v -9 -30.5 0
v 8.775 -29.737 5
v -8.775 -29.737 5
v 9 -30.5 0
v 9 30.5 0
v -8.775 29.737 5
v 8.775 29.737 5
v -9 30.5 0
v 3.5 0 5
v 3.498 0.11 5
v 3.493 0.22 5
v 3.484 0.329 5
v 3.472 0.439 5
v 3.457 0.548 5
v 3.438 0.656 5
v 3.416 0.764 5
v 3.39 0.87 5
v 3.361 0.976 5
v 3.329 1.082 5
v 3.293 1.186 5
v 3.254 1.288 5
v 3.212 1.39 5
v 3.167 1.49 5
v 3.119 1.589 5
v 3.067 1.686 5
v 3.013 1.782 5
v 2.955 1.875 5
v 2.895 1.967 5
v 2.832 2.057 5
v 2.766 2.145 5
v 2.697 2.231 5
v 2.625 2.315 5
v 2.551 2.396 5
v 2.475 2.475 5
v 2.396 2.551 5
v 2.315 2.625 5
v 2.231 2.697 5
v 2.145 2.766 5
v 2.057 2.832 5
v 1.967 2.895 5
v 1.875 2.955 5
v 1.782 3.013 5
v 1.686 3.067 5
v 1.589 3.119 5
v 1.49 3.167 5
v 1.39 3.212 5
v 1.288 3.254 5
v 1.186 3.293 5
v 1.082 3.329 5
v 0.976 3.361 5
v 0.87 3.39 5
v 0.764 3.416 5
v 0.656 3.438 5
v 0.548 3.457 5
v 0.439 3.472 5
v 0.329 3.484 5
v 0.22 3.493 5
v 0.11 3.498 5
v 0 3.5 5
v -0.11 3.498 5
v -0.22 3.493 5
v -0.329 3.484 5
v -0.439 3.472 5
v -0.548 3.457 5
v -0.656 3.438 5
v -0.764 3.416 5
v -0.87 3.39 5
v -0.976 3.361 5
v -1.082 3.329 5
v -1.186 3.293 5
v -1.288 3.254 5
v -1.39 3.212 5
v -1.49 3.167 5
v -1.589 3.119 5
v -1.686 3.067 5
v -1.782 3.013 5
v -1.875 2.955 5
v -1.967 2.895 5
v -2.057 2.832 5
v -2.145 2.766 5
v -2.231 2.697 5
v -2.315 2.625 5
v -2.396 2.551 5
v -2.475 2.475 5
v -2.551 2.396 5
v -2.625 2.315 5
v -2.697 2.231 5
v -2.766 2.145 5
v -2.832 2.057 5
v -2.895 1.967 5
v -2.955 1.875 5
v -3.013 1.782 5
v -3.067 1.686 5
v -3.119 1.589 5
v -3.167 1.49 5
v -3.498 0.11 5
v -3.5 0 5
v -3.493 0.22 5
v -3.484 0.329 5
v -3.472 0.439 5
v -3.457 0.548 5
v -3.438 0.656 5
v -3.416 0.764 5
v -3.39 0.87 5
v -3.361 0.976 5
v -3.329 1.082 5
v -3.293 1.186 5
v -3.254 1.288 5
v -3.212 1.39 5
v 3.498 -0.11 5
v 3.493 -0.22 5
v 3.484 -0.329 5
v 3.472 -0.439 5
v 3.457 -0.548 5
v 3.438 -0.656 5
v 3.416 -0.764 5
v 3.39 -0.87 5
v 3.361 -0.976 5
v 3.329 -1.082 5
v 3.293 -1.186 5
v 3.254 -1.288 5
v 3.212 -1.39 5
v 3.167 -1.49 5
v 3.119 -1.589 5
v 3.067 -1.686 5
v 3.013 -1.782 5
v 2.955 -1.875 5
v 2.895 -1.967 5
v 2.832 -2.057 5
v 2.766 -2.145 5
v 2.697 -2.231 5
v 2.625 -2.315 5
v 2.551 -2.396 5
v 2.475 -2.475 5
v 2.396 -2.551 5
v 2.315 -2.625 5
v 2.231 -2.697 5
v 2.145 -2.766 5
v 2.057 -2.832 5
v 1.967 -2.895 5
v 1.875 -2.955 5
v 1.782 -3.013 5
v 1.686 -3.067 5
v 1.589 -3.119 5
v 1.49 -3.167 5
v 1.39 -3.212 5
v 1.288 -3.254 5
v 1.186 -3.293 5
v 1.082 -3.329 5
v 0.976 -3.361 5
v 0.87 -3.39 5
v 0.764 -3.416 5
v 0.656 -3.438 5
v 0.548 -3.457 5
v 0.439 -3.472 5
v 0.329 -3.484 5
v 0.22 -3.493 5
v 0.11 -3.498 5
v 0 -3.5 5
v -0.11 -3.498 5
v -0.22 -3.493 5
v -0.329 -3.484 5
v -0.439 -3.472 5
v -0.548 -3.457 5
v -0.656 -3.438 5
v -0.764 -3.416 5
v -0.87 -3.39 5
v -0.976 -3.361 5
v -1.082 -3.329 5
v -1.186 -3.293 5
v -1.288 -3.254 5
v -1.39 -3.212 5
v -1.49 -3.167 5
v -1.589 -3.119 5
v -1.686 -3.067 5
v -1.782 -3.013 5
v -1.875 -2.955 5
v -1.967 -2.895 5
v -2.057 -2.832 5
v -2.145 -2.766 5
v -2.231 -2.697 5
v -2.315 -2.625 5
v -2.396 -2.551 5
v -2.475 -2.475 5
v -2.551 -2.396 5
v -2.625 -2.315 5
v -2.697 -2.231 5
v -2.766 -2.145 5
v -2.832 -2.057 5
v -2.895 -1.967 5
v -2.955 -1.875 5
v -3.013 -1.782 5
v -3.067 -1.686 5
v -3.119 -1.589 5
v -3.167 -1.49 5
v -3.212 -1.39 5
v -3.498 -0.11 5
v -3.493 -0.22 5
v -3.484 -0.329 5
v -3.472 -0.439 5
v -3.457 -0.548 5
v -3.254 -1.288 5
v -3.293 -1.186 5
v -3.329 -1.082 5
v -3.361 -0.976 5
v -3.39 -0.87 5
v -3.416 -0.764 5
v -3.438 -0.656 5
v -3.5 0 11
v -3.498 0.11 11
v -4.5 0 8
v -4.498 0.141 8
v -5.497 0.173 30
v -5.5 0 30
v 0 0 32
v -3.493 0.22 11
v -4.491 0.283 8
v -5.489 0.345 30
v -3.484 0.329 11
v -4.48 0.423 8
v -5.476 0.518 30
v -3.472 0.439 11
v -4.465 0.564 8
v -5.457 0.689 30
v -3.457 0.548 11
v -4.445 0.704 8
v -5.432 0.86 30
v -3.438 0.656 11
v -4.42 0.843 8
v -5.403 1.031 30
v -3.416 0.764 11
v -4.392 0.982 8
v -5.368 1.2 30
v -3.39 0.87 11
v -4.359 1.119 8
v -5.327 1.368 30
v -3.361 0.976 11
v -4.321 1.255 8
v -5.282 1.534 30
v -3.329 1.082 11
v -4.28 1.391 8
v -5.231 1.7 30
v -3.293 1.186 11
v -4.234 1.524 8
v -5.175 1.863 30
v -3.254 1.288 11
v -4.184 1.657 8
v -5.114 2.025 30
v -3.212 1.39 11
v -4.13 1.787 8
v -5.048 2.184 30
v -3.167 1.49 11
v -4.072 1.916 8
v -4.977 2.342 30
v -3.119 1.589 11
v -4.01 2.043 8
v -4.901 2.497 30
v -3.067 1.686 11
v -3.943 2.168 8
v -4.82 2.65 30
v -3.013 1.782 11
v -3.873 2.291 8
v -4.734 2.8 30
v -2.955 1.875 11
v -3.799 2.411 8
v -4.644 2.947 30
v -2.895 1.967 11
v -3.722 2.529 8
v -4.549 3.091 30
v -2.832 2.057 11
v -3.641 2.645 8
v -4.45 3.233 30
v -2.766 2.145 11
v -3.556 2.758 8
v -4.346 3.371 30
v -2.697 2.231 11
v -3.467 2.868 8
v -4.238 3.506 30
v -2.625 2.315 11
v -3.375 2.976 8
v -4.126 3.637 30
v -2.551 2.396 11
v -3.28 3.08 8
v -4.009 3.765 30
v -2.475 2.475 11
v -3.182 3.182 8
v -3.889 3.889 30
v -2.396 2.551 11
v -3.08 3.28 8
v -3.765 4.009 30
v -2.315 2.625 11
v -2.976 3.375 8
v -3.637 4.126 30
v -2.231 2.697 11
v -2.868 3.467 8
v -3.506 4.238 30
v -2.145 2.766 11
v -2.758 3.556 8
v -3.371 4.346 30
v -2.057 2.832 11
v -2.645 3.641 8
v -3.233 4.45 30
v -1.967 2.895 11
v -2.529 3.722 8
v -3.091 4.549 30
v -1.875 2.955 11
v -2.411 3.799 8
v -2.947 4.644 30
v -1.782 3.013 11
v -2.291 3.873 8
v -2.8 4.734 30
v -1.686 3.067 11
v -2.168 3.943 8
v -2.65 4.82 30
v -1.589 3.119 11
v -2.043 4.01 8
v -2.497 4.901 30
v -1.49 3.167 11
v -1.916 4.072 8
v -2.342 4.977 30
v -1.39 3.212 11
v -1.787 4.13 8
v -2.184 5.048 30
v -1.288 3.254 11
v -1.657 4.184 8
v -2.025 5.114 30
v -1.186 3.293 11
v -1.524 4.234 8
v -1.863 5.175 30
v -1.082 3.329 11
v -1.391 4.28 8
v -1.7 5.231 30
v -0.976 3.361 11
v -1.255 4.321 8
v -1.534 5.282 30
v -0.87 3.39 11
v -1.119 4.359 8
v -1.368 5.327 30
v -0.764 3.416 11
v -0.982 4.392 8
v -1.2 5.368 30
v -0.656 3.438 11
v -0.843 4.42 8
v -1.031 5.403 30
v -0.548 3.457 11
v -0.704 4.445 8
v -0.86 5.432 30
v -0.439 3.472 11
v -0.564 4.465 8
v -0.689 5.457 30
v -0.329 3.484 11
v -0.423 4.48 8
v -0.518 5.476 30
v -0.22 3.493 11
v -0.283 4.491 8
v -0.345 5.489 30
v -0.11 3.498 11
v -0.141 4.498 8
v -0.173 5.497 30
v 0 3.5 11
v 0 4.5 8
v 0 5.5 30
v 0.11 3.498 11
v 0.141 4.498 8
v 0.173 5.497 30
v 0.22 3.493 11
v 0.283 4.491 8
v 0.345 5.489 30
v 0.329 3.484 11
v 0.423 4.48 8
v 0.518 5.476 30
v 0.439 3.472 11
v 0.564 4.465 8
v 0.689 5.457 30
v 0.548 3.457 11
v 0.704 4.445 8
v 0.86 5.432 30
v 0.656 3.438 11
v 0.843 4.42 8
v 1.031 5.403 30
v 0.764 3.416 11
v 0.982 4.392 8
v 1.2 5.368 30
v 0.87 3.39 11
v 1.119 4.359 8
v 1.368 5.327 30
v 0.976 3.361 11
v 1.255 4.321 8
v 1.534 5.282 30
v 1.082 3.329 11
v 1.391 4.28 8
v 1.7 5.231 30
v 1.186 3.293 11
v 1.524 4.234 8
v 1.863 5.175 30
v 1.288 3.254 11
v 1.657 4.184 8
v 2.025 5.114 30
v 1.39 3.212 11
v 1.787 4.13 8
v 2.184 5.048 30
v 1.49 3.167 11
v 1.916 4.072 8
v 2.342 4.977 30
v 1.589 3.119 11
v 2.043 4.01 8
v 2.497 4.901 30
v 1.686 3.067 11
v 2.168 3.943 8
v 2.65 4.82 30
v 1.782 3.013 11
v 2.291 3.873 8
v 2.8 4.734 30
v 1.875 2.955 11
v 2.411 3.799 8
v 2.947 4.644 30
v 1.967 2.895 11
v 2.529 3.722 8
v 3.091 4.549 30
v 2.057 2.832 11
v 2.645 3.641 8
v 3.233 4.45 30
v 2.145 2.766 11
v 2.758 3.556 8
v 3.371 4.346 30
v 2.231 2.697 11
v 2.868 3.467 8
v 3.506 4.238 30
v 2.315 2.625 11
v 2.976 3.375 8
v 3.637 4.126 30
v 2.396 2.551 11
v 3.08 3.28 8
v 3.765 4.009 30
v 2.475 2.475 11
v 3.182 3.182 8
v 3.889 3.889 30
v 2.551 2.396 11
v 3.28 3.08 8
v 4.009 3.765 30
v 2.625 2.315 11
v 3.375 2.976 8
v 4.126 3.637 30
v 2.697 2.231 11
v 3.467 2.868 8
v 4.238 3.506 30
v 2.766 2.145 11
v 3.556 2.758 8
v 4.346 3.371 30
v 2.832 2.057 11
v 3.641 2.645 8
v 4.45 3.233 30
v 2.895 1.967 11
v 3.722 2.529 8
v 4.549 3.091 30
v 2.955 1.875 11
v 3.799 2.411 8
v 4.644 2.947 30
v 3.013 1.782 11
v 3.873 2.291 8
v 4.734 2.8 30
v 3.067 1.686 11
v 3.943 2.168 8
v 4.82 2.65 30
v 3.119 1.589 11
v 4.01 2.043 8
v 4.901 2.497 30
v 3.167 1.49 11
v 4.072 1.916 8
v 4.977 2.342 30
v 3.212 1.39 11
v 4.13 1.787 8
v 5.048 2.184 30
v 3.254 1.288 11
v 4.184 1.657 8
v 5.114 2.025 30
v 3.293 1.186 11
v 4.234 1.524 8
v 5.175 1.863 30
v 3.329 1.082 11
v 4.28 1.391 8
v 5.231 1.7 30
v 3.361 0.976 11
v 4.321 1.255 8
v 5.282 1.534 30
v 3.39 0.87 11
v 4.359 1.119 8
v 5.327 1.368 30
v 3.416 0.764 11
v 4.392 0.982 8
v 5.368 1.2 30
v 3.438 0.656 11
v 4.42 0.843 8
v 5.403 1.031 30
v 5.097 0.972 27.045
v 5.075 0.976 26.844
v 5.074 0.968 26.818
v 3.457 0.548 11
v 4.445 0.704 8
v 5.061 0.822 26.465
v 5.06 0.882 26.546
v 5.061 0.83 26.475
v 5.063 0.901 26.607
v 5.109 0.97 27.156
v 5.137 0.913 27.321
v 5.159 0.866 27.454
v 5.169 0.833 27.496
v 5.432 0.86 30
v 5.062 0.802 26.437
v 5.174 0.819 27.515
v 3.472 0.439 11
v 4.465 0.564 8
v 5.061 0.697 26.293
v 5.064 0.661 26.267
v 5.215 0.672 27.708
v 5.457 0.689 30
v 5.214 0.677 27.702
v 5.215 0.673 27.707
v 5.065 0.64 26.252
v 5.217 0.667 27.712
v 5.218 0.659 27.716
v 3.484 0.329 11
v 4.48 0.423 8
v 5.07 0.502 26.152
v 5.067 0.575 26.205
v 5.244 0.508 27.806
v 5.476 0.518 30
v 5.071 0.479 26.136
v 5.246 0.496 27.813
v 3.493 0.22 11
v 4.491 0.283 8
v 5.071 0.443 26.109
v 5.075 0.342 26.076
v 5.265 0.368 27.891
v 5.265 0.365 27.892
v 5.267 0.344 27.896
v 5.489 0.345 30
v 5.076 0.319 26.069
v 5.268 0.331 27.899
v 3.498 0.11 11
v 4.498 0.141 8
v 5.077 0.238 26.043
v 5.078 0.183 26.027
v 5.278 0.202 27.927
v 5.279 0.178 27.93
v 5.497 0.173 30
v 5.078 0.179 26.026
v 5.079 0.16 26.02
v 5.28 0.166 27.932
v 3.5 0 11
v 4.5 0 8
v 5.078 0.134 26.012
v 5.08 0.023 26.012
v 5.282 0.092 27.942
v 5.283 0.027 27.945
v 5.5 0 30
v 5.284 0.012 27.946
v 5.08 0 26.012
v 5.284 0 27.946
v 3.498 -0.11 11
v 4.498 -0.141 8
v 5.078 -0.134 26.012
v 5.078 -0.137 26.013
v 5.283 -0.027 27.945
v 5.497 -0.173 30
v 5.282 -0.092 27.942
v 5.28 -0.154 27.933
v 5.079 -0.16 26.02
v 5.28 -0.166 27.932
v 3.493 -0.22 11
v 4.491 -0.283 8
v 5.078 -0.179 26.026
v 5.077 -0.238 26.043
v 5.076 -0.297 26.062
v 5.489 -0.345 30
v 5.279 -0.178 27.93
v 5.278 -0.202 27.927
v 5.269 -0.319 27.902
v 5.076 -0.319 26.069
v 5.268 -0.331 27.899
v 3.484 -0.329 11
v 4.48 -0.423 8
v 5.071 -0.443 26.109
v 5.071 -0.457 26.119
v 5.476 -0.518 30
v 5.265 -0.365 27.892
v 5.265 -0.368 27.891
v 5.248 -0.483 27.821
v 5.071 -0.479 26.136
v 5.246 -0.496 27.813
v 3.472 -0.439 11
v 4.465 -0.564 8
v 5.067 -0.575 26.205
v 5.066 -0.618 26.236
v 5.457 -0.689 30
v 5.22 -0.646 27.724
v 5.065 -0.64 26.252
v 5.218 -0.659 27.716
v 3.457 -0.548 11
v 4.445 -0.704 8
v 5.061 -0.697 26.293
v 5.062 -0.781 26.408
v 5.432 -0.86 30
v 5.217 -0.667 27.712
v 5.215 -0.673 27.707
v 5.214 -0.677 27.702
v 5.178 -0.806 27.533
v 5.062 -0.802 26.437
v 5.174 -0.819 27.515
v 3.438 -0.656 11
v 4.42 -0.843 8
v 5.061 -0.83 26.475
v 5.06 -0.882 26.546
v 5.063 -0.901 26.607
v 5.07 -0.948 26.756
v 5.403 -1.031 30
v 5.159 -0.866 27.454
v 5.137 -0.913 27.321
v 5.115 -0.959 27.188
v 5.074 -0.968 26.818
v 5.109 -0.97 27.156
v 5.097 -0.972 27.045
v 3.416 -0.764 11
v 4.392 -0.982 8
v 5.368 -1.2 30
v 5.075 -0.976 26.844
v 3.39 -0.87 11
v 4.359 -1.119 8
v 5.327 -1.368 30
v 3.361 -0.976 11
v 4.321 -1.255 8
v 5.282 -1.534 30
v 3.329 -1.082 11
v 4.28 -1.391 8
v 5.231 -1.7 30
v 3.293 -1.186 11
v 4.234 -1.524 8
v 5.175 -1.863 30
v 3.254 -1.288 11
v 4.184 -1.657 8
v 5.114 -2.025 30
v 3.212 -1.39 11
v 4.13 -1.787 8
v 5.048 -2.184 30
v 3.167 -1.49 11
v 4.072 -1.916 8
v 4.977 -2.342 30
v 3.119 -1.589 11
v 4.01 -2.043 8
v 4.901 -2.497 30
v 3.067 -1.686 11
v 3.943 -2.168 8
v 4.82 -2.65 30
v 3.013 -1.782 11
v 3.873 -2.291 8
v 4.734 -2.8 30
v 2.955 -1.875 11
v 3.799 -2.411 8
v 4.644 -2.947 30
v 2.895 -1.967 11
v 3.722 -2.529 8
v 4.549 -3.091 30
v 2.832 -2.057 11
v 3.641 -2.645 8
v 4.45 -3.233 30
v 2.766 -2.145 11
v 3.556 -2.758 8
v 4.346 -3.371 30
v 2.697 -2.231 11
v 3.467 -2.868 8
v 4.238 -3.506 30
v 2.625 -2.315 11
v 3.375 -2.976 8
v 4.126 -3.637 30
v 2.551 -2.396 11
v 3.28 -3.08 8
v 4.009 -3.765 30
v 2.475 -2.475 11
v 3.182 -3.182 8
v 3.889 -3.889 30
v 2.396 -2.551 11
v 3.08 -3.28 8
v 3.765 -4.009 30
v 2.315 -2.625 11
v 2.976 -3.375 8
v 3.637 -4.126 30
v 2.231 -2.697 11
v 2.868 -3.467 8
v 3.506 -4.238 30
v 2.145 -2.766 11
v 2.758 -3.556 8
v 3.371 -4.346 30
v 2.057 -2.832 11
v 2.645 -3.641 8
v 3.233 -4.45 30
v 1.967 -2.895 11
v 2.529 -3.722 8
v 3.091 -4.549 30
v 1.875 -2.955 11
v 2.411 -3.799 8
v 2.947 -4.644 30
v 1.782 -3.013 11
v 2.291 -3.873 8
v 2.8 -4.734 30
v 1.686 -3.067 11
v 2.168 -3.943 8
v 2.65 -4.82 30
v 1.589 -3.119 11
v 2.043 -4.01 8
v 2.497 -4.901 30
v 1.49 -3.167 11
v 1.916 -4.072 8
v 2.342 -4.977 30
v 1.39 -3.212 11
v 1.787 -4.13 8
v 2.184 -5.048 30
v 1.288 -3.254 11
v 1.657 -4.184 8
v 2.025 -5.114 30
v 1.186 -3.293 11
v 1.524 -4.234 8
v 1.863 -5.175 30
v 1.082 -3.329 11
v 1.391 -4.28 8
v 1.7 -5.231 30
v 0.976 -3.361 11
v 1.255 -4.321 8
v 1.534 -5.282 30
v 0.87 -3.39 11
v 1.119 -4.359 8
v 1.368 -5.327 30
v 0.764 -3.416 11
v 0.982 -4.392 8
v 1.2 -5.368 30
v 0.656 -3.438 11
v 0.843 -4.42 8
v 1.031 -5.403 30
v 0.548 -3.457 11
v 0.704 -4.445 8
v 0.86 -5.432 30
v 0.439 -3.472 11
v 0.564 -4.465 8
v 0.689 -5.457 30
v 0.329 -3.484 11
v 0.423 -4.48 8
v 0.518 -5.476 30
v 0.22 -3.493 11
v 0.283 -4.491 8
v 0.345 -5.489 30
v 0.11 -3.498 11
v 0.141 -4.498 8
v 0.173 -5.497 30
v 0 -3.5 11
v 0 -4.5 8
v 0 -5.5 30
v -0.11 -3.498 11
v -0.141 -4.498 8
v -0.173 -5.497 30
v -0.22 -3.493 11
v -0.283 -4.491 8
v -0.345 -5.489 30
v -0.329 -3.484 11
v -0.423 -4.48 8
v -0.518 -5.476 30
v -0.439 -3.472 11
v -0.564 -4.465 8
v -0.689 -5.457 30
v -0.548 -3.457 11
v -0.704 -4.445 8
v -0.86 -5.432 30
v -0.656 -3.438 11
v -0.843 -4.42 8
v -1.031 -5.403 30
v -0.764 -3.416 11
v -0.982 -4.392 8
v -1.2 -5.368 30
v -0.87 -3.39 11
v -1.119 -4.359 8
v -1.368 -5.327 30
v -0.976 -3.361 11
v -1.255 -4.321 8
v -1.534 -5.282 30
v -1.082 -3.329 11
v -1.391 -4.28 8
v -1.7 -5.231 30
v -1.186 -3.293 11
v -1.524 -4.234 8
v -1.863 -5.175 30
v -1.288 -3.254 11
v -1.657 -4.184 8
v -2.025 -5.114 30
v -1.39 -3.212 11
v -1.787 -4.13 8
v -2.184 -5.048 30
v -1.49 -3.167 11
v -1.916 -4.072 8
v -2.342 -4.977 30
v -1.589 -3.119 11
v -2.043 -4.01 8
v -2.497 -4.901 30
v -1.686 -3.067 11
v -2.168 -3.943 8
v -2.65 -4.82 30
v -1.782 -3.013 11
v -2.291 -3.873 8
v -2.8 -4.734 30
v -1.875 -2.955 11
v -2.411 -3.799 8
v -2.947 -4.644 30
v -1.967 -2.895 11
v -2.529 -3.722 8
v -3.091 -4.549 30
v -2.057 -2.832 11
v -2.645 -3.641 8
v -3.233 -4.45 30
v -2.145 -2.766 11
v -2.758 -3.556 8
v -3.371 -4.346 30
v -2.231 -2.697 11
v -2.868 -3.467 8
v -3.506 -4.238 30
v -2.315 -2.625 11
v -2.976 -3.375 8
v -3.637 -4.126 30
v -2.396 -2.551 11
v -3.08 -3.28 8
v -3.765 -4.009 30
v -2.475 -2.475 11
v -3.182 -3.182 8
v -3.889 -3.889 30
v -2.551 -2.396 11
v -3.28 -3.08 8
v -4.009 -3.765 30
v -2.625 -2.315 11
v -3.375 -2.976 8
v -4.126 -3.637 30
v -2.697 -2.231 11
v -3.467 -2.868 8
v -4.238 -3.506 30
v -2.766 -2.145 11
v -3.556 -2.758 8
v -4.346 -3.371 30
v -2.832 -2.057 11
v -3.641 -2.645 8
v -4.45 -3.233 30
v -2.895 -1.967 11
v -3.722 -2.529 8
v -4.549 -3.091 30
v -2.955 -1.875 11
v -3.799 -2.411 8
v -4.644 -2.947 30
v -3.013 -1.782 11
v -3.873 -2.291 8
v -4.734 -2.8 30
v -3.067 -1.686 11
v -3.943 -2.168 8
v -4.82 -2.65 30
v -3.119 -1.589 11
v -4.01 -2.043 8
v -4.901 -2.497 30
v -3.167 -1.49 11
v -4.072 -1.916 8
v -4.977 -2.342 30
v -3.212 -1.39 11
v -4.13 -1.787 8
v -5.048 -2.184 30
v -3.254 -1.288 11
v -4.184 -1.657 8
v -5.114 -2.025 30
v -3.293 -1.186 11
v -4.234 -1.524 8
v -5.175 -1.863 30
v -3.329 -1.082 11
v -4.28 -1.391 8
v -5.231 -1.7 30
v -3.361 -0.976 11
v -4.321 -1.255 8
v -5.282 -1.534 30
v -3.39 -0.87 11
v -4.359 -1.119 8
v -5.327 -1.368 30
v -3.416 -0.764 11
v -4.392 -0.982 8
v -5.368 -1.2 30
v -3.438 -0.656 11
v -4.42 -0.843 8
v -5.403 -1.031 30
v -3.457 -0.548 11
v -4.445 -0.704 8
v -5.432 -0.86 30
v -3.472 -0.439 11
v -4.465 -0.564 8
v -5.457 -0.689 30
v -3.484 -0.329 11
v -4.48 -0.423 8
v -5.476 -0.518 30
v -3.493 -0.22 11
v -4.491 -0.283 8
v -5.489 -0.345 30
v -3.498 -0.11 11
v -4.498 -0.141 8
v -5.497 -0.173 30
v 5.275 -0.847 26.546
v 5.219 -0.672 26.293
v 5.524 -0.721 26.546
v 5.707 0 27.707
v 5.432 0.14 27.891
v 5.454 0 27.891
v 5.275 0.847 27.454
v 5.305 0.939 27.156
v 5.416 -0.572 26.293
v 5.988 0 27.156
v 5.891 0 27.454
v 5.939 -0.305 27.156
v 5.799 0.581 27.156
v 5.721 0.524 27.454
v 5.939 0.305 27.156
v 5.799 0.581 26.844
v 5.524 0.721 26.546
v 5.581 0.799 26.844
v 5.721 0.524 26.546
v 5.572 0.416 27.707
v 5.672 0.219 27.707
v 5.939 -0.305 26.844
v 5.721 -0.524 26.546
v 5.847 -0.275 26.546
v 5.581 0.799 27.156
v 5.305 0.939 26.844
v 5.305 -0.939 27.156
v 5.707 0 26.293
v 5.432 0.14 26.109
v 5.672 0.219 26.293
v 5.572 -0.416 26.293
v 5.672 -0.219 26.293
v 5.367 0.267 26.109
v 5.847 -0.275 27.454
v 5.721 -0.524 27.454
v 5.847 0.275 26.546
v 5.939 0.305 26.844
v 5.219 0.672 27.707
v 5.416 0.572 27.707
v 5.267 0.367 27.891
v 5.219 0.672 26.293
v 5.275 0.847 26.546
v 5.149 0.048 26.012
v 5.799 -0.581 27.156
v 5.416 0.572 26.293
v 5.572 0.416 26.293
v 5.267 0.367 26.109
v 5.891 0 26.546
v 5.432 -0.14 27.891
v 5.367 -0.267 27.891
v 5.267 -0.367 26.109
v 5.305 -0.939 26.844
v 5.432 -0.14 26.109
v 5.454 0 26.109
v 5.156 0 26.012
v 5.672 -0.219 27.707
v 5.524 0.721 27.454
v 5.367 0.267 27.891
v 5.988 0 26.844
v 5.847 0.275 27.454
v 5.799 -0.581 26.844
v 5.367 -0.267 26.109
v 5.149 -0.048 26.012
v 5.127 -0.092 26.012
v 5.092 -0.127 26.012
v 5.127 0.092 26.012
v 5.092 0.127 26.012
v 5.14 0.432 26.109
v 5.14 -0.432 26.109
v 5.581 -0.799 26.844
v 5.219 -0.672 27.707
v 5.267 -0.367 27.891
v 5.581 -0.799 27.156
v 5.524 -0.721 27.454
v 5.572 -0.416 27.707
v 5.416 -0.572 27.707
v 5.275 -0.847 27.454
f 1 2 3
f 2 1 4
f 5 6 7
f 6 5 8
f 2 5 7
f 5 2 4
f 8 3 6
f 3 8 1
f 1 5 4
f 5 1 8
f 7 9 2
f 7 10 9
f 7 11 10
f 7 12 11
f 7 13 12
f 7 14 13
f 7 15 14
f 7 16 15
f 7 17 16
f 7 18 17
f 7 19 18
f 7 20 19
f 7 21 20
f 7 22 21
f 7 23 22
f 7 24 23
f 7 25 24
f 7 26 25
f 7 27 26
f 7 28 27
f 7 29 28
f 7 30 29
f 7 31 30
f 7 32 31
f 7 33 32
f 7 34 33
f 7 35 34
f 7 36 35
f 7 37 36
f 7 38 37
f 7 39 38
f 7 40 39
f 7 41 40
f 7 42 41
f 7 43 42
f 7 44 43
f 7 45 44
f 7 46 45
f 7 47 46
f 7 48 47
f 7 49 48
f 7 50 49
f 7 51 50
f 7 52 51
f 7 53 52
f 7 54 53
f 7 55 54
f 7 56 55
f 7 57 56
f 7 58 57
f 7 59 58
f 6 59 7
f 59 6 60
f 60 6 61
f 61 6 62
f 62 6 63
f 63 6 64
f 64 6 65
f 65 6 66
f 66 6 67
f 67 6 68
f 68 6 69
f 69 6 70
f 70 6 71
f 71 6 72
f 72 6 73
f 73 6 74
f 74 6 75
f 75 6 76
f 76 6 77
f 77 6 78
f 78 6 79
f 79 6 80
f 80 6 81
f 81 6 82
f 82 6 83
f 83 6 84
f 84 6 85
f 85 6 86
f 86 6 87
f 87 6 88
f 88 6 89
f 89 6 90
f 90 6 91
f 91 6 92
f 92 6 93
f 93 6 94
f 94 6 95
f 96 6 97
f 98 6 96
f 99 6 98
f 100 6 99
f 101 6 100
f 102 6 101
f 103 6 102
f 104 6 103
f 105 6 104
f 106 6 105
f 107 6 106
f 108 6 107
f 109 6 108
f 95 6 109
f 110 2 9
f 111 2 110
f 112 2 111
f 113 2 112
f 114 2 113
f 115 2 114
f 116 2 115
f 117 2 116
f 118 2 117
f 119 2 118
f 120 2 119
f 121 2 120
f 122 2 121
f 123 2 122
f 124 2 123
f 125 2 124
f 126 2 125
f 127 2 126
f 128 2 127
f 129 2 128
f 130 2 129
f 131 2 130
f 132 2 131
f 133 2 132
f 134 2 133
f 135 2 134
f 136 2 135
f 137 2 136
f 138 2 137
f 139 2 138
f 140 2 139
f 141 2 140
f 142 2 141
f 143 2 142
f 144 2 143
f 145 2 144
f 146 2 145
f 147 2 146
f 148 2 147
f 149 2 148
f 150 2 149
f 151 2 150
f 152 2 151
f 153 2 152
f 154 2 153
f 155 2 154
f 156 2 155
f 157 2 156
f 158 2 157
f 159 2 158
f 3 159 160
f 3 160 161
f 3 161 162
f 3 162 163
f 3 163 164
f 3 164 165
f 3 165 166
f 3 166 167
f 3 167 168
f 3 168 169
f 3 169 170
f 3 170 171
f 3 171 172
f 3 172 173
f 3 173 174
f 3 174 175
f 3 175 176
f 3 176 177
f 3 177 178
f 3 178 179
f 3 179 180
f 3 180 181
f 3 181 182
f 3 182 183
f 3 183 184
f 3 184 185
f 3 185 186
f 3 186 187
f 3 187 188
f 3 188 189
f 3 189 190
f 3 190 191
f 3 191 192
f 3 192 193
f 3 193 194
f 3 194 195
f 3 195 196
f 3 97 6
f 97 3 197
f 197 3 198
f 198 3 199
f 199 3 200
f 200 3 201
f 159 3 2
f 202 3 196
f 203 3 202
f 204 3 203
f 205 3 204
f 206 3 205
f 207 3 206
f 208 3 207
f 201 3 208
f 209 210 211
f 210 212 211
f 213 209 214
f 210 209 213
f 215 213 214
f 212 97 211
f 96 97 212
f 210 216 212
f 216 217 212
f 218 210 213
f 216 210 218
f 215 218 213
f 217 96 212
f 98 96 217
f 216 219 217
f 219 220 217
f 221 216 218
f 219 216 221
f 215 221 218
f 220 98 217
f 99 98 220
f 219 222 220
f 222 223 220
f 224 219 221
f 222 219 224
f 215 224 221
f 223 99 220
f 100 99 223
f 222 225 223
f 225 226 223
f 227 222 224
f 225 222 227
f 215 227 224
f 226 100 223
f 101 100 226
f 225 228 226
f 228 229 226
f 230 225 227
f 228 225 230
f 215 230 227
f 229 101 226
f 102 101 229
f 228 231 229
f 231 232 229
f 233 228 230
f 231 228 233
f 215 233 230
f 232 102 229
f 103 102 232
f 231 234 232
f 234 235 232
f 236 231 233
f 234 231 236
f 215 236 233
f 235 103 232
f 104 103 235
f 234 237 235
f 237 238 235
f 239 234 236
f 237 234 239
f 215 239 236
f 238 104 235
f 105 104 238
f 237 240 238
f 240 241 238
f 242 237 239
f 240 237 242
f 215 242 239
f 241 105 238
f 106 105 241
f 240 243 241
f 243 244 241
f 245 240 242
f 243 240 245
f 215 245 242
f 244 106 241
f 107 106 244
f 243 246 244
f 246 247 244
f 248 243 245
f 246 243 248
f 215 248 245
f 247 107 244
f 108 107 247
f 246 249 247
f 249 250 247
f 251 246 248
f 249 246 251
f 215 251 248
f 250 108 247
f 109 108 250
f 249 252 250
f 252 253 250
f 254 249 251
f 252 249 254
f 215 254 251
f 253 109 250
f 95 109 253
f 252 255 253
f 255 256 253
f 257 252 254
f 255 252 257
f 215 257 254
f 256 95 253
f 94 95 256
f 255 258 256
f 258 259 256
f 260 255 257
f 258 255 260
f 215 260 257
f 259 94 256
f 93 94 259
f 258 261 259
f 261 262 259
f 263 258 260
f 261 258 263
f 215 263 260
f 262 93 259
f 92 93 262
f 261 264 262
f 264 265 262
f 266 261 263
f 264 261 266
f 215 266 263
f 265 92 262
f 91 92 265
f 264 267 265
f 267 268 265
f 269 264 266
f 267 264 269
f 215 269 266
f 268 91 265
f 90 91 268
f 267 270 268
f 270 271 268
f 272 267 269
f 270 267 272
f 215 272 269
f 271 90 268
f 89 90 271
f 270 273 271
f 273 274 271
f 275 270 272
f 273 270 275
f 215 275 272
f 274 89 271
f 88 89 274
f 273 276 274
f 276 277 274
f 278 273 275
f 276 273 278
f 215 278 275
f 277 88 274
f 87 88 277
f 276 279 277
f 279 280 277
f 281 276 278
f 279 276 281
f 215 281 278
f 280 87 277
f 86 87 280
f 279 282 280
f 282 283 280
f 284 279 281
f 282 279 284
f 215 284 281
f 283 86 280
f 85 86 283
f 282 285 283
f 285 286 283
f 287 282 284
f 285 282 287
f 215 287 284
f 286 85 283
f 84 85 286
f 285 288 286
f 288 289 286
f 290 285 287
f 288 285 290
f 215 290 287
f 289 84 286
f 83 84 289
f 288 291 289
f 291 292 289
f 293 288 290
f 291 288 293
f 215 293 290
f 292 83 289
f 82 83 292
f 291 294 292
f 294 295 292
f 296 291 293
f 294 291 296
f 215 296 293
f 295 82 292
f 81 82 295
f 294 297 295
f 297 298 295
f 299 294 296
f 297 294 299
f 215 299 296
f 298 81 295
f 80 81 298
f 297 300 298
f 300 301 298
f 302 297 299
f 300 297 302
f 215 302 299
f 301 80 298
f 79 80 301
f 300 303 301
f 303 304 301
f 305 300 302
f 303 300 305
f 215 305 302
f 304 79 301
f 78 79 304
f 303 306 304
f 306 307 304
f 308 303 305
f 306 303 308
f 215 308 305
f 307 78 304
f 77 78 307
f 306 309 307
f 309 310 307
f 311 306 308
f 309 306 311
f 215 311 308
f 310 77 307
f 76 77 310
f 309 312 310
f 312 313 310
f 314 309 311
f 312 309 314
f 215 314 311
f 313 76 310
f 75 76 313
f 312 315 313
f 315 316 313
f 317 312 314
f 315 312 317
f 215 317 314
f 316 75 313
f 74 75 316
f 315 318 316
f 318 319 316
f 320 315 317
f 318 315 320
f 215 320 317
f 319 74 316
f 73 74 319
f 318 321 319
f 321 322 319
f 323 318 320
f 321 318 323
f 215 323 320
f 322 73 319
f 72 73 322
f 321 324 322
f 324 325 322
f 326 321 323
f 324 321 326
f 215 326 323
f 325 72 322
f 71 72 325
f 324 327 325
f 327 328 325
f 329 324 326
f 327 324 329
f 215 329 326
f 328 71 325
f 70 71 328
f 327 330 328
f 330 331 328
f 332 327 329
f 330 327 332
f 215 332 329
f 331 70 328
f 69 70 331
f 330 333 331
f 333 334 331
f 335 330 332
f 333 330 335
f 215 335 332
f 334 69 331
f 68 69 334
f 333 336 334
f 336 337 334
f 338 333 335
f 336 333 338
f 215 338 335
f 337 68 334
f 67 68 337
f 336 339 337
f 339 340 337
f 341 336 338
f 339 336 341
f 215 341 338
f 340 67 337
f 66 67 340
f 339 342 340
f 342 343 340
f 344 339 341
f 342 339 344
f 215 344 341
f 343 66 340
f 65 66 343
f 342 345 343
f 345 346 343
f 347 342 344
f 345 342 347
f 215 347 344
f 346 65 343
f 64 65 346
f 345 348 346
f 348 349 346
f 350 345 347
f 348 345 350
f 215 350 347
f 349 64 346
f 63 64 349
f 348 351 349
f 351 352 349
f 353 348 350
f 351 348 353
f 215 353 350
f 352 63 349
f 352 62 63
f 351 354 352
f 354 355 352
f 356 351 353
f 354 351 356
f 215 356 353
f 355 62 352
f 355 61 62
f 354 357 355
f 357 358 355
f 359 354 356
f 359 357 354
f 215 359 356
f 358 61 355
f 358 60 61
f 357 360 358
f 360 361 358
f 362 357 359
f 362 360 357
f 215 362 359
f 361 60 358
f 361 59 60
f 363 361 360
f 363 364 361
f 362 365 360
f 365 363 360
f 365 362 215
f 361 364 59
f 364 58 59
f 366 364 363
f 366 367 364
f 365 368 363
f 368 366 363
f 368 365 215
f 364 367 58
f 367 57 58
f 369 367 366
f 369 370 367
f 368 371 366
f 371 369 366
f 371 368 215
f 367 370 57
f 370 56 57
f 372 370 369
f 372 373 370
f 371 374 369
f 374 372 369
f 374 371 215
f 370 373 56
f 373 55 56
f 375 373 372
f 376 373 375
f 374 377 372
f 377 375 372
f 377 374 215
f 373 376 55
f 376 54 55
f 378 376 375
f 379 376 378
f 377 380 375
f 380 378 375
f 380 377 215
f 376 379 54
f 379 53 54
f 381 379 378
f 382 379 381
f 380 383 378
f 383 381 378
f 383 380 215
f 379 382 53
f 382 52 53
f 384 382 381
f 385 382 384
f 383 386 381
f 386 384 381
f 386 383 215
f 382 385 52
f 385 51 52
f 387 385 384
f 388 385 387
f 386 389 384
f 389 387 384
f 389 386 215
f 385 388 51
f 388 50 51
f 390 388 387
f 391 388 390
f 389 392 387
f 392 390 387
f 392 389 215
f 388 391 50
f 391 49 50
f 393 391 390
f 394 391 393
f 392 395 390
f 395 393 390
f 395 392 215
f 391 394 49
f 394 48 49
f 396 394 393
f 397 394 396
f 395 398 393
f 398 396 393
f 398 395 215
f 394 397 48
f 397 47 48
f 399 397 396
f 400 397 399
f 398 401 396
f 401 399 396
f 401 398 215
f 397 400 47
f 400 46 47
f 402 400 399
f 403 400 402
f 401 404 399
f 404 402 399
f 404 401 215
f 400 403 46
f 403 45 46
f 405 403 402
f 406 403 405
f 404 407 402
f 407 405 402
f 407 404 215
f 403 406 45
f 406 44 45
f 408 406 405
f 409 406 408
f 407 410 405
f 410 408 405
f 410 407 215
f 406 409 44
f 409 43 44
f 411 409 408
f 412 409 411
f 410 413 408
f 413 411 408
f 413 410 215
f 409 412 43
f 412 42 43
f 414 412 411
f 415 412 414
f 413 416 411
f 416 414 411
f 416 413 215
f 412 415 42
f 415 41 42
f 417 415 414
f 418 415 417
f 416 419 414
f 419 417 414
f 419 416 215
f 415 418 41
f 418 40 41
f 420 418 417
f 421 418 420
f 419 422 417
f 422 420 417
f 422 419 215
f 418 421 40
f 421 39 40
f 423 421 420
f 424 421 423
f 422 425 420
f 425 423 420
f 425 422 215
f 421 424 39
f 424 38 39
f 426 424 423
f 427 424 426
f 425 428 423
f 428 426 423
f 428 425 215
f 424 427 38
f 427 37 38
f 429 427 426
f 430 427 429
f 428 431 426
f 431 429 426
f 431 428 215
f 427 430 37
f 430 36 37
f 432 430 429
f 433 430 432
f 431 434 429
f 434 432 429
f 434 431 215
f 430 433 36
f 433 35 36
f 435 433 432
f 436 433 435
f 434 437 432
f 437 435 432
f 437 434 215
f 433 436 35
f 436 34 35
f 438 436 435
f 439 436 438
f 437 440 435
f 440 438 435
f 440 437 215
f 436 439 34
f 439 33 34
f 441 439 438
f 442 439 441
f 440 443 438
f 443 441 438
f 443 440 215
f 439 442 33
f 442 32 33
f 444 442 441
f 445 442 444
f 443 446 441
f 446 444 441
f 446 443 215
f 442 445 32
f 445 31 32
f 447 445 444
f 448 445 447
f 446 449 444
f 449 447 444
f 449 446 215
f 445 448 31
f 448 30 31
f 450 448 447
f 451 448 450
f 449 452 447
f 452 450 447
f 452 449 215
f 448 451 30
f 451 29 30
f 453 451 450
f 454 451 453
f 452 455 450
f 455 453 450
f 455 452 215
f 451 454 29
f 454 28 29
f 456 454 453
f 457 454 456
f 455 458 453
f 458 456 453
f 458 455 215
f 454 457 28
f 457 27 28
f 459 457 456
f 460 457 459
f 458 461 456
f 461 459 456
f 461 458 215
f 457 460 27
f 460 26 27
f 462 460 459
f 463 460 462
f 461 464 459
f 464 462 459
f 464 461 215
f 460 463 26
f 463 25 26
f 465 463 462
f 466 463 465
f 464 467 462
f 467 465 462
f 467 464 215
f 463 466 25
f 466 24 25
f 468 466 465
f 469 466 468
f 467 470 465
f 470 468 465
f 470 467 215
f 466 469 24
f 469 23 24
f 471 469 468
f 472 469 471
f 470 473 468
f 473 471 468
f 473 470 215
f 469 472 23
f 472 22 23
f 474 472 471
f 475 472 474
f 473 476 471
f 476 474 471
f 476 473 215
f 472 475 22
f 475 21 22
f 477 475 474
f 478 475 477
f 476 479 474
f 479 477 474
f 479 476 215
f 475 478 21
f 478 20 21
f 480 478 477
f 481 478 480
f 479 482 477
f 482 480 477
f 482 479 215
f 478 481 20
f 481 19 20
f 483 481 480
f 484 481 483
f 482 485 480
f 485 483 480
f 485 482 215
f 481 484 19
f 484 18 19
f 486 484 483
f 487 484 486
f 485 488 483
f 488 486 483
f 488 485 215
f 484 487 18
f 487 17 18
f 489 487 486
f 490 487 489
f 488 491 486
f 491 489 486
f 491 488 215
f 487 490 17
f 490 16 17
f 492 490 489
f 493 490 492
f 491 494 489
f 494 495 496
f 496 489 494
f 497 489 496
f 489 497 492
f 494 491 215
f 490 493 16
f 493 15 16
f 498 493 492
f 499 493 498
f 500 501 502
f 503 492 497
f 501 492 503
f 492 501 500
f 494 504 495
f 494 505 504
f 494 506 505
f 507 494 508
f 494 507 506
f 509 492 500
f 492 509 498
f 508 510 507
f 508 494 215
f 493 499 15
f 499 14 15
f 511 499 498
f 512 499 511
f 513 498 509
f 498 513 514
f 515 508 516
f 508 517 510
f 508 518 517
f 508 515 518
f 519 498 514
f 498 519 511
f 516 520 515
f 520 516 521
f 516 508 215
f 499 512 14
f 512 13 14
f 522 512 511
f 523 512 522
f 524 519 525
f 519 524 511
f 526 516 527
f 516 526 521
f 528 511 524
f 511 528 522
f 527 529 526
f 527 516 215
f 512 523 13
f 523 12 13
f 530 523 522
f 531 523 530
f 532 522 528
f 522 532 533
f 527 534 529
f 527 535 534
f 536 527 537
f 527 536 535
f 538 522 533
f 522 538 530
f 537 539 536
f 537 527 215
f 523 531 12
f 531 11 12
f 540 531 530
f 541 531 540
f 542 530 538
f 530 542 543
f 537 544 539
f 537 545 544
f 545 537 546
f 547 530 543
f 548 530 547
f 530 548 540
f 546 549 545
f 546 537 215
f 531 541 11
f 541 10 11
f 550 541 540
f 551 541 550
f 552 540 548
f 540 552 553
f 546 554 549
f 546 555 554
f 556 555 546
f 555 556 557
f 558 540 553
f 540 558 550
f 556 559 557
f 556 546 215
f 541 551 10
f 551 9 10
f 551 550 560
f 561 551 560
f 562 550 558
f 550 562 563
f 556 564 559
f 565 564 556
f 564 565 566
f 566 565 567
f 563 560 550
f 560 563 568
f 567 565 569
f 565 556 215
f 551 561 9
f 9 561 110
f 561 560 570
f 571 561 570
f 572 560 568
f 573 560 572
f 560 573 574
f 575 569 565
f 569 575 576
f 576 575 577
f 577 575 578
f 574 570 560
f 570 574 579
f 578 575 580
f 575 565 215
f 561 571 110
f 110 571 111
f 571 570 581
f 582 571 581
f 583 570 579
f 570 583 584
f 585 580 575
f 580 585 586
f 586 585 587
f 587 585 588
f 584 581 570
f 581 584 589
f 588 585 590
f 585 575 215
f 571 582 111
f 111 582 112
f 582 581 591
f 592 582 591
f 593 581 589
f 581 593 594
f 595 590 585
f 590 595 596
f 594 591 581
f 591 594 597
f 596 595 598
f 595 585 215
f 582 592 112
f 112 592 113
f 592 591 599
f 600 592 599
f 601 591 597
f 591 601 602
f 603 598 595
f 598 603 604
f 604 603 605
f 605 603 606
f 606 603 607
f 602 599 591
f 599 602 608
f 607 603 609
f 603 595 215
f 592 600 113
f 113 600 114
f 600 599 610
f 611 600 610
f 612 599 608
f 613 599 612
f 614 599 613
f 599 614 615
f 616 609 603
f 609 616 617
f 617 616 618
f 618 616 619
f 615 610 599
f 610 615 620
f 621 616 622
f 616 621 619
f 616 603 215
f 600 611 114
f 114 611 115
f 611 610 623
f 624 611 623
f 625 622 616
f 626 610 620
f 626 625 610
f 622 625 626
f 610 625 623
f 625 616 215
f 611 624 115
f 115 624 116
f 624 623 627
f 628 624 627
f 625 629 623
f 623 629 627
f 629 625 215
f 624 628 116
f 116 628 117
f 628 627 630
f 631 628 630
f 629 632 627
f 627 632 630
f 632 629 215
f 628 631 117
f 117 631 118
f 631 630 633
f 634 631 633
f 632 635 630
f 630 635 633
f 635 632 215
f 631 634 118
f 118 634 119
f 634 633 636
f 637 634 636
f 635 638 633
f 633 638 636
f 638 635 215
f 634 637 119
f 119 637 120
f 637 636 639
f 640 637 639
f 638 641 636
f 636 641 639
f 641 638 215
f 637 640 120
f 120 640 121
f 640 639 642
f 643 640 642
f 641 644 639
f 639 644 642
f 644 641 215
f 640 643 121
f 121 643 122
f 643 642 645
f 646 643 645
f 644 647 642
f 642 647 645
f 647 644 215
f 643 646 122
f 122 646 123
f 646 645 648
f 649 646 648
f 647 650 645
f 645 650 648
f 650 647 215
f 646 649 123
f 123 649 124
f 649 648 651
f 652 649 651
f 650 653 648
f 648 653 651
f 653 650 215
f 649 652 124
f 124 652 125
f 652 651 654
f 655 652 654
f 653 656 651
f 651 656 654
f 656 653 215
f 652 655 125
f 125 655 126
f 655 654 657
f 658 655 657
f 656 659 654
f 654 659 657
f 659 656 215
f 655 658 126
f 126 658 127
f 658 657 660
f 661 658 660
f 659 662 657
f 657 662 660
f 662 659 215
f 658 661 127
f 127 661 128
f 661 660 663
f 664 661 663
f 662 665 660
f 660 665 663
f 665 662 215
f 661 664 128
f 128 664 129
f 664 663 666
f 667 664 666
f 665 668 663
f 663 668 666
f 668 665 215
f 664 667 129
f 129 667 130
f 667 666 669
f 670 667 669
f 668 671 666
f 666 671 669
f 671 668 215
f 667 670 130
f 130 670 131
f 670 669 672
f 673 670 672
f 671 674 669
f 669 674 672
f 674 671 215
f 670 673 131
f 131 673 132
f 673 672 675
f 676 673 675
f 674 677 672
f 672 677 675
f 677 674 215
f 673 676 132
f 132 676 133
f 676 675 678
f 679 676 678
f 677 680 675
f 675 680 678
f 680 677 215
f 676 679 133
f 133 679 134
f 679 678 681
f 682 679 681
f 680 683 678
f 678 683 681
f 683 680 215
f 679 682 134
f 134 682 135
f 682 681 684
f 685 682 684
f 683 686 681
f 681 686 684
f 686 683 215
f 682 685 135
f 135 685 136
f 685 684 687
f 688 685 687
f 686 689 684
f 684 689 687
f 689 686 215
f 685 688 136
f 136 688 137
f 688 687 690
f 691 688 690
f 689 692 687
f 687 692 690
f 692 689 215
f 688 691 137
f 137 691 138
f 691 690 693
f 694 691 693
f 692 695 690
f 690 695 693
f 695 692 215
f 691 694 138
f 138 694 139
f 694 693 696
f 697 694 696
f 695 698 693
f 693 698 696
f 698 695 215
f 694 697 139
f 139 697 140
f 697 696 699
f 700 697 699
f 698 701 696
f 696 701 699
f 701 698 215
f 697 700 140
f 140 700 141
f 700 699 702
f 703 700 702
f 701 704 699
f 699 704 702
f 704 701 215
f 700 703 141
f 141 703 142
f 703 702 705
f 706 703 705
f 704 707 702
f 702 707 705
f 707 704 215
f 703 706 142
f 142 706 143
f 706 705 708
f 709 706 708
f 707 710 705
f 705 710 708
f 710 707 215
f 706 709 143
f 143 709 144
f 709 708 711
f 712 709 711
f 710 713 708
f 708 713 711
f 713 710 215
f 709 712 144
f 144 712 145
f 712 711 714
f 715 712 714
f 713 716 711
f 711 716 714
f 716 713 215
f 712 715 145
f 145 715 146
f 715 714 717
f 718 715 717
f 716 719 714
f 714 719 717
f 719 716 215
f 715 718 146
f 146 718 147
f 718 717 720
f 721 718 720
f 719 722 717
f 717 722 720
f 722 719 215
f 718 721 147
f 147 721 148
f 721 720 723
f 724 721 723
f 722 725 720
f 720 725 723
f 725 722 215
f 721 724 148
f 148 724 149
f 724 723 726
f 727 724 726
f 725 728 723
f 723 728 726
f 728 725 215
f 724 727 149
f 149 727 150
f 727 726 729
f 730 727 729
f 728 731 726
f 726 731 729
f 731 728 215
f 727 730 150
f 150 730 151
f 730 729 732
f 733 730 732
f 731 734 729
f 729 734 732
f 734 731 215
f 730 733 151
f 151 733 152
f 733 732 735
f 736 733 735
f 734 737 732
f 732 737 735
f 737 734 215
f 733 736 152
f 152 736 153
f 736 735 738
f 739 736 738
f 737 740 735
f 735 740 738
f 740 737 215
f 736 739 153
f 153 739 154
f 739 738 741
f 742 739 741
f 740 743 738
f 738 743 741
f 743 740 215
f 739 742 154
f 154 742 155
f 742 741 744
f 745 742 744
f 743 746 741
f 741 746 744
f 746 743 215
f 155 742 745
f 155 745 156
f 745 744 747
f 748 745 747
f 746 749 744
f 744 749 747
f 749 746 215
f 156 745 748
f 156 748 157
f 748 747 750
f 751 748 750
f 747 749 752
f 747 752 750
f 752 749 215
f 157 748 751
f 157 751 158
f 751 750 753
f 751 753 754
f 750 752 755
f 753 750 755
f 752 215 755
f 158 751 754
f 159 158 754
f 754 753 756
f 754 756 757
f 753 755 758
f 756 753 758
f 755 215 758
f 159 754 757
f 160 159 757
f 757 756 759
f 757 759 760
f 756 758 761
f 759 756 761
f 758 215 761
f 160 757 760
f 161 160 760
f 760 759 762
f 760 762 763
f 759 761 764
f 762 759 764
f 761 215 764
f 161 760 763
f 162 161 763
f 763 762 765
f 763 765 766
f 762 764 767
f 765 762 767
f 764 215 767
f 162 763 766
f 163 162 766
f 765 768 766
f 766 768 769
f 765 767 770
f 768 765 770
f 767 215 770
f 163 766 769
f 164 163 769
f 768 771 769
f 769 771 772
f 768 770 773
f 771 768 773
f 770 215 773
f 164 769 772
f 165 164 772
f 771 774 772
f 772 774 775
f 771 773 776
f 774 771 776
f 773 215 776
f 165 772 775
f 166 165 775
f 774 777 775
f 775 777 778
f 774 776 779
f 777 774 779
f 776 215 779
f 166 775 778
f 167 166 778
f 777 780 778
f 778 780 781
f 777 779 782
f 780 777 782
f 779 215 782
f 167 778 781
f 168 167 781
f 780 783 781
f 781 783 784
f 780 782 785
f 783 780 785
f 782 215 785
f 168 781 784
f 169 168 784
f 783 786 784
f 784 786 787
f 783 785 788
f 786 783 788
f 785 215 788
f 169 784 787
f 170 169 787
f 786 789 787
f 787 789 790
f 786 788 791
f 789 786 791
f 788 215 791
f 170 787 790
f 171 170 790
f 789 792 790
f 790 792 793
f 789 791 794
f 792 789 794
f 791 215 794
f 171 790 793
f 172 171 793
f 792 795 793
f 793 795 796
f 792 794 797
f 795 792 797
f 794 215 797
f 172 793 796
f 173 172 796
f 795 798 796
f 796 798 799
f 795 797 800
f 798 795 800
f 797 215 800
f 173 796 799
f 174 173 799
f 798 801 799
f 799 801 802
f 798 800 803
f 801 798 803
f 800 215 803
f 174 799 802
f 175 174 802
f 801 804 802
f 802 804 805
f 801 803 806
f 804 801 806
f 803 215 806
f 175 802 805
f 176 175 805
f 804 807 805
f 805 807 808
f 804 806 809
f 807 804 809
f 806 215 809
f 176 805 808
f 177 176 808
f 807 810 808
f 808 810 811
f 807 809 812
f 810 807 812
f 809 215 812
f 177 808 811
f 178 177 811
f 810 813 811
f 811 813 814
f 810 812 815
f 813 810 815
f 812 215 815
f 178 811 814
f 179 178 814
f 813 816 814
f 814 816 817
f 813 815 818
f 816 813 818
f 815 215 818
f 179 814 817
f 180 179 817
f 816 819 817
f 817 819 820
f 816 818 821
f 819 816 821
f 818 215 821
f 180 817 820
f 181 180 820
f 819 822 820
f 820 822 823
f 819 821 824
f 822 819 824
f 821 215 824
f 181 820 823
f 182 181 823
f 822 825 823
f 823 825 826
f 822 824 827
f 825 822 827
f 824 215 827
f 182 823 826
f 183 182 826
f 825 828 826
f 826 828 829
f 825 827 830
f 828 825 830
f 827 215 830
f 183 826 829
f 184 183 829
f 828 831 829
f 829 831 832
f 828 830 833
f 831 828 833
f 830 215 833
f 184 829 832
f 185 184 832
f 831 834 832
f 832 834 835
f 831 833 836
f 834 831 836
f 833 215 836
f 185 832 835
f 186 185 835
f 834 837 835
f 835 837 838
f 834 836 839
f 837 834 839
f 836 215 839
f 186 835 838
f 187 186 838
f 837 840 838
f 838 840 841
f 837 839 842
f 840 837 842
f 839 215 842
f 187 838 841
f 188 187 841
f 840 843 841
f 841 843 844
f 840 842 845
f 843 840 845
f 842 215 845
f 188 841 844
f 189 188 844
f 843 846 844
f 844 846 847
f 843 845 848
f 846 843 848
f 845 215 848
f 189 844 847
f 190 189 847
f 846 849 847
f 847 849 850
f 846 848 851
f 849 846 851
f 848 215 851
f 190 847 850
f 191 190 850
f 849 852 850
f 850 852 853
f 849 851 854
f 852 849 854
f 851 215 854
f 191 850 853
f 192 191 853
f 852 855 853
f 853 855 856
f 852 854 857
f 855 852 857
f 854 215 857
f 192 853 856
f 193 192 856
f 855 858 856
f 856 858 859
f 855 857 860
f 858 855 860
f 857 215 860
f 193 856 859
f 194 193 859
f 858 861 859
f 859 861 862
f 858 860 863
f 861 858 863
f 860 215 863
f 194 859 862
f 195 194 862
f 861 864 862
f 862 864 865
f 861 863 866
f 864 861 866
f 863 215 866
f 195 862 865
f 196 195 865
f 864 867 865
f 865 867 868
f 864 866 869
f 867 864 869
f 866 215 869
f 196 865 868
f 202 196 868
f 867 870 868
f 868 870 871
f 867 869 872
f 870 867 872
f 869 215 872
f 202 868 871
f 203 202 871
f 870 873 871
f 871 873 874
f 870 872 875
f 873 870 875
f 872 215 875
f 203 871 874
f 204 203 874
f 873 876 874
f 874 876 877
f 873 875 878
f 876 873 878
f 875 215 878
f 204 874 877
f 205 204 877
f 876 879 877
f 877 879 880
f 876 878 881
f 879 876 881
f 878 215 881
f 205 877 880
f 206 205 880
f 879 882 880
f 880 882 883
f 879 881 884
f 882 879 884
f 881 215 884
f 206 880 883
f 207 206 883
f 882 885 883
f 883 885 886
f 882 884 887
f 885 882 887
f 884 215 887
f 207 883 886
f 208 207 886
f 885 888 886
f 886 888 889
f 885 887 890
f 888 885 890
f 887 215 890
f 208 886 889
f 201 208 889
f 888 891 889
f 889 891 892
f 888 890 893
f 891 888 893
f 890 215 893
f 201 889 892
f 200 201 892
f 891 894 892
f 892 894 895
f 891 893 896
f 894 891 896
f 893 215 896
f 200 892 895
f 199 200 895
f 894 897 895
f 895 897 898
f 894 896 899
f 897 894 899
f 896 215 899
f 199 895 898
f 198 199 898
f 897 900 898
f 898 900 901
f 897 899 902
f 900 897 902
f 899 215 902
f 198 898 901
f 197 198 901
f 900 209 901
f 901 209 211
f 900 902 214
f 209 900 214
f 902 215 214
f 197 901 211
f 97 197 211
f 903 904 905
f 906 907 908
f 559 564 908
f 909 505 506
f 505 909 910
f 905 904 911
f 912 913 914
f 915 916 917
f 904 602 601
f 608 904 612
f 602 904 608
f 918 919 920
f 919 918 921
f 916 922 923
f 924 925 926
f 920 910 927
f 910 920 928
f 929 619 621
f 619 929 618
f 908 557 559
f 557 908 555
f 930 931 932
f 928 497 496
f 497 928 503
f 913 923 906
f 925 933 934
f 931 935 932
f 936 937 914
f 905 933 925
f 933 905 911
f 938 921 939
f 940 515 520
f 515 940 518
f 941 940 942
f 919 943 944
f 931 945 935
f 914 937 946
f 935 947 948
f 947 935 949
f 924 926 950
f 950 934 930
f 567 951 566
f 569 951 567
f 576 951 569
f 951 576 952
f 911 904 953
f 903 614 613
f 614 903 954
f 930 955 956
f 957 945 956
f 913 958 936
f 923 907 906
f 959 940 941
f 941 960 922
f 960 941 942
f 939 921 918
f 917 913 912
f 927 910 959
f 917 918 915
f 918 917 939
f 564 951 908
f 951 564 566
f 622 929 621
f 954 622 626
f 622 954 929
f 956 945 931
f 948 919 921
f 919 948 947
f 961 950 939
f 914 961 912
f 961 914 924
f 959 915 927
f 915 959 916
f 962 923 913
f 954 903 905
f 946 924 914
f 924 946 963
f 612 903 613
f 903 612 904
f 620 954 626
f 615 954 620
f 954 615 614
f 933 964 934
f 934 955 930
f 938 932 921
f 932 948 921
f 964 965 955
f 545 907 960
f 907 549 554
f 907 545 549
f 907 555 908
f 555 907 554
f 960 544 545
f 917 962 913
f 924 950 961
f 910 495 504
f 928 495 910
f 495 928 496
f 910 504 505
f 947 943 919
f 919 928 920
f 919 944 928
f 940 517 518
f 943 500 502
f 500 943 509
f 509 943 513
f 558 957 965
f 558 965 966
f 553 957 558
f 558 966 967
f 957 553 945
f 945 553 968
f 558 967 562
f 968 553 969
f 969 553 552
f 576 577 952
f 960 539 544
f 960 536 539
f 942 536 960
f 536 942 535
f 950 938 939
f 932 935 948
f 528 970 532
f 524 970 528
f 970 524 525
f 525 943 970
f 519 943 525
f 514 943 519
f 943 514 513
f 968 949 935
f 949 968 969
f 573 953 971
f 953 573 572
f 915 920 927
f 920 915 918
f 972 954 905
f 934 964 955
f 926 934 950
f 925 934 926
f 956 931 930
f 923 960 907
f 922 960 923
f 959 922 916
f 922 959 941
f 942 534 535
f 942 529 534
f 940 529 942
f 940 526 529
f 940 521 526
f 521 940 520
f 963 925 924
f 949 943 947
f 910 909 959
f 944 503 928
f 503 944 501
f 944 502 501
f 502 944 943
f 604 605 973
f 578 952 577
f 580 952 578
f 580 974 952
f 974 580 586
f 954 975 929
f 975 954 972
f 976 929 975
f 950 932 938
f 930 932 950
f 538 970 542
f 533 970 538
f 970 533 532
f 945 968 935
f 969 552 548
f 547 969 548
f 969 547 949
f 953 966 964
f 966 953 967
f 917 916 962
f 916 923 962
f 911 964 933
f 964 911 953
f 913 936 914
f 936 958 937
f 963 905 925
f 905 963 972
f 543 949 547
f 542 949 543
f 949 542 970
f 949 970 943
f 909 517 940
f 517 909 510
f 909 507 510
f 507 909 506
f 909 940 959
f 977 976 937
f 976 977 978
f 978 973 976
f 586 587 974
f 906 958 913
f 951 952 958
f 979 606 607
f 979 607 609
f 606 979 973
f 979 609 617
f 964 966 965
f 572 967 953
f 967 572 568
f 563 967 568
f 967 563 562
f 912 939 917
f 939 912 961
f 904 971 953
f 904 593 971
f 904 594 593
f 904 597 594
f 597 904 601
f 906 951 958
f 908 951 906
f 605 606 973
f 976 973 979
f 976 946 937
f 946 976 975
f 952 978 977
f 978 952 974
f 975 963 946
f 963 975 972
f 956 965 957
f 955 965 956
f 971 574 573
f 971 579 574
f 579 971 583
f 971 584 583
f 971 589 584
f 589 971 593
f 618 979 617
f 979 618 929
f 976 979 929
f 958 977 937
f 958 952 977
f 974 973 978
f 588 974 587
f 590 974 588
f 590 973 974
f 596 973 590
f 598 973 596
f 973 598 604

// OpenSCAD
// [FL_INDEX: keywords="openscad, 3d_parametric, Stamp_Handle_02, csg_solid" | COT="Parametric OpenSCAD design from 3DCodeverse"]
// Title: Stamp Handle 02

WIDTH 	= 18; // [0:200]
LENGTH 	= 61; // [0:200]


translate([-WIDTH/2,-LENGTH/2,0]) {
	difference() {
		pyramid(WIDTH,LENGTH,200);
	   translate([0,0,5]) cube([WIDTH,LENGTH,200]);
	}
	
	translate([WIDTH/2,LENGTH/2,5]) {
		rotate_extrude($fn=200) polygon(points=[[0,0],[3.5,0],[4.5,3],[3.5,6],[5.5,25],[0,27]]);
		translate([5,0,22]) sphere(r=1, $fn=20);
	}
}



// By Danny Staple, https://github.com/dannystaple/OpenSCAD-Parts-Library
module pyramid(w, l, h) {
	mw = w/2;
	ml = l/2;
	polyhedron(points = [
		[0, 0, 0],
		[w, 0, 0],
		[0, l, 0],
		[w, l, 0],
		[mw, ml, h]
	], triangles = [
		[4, 1, 0],
		[4, 3, 1],
		[4, 2, 3],
		[4, 0, 2],
	//base
		[0, 1, 2],
		[2, 1, 3]
	]);
}
